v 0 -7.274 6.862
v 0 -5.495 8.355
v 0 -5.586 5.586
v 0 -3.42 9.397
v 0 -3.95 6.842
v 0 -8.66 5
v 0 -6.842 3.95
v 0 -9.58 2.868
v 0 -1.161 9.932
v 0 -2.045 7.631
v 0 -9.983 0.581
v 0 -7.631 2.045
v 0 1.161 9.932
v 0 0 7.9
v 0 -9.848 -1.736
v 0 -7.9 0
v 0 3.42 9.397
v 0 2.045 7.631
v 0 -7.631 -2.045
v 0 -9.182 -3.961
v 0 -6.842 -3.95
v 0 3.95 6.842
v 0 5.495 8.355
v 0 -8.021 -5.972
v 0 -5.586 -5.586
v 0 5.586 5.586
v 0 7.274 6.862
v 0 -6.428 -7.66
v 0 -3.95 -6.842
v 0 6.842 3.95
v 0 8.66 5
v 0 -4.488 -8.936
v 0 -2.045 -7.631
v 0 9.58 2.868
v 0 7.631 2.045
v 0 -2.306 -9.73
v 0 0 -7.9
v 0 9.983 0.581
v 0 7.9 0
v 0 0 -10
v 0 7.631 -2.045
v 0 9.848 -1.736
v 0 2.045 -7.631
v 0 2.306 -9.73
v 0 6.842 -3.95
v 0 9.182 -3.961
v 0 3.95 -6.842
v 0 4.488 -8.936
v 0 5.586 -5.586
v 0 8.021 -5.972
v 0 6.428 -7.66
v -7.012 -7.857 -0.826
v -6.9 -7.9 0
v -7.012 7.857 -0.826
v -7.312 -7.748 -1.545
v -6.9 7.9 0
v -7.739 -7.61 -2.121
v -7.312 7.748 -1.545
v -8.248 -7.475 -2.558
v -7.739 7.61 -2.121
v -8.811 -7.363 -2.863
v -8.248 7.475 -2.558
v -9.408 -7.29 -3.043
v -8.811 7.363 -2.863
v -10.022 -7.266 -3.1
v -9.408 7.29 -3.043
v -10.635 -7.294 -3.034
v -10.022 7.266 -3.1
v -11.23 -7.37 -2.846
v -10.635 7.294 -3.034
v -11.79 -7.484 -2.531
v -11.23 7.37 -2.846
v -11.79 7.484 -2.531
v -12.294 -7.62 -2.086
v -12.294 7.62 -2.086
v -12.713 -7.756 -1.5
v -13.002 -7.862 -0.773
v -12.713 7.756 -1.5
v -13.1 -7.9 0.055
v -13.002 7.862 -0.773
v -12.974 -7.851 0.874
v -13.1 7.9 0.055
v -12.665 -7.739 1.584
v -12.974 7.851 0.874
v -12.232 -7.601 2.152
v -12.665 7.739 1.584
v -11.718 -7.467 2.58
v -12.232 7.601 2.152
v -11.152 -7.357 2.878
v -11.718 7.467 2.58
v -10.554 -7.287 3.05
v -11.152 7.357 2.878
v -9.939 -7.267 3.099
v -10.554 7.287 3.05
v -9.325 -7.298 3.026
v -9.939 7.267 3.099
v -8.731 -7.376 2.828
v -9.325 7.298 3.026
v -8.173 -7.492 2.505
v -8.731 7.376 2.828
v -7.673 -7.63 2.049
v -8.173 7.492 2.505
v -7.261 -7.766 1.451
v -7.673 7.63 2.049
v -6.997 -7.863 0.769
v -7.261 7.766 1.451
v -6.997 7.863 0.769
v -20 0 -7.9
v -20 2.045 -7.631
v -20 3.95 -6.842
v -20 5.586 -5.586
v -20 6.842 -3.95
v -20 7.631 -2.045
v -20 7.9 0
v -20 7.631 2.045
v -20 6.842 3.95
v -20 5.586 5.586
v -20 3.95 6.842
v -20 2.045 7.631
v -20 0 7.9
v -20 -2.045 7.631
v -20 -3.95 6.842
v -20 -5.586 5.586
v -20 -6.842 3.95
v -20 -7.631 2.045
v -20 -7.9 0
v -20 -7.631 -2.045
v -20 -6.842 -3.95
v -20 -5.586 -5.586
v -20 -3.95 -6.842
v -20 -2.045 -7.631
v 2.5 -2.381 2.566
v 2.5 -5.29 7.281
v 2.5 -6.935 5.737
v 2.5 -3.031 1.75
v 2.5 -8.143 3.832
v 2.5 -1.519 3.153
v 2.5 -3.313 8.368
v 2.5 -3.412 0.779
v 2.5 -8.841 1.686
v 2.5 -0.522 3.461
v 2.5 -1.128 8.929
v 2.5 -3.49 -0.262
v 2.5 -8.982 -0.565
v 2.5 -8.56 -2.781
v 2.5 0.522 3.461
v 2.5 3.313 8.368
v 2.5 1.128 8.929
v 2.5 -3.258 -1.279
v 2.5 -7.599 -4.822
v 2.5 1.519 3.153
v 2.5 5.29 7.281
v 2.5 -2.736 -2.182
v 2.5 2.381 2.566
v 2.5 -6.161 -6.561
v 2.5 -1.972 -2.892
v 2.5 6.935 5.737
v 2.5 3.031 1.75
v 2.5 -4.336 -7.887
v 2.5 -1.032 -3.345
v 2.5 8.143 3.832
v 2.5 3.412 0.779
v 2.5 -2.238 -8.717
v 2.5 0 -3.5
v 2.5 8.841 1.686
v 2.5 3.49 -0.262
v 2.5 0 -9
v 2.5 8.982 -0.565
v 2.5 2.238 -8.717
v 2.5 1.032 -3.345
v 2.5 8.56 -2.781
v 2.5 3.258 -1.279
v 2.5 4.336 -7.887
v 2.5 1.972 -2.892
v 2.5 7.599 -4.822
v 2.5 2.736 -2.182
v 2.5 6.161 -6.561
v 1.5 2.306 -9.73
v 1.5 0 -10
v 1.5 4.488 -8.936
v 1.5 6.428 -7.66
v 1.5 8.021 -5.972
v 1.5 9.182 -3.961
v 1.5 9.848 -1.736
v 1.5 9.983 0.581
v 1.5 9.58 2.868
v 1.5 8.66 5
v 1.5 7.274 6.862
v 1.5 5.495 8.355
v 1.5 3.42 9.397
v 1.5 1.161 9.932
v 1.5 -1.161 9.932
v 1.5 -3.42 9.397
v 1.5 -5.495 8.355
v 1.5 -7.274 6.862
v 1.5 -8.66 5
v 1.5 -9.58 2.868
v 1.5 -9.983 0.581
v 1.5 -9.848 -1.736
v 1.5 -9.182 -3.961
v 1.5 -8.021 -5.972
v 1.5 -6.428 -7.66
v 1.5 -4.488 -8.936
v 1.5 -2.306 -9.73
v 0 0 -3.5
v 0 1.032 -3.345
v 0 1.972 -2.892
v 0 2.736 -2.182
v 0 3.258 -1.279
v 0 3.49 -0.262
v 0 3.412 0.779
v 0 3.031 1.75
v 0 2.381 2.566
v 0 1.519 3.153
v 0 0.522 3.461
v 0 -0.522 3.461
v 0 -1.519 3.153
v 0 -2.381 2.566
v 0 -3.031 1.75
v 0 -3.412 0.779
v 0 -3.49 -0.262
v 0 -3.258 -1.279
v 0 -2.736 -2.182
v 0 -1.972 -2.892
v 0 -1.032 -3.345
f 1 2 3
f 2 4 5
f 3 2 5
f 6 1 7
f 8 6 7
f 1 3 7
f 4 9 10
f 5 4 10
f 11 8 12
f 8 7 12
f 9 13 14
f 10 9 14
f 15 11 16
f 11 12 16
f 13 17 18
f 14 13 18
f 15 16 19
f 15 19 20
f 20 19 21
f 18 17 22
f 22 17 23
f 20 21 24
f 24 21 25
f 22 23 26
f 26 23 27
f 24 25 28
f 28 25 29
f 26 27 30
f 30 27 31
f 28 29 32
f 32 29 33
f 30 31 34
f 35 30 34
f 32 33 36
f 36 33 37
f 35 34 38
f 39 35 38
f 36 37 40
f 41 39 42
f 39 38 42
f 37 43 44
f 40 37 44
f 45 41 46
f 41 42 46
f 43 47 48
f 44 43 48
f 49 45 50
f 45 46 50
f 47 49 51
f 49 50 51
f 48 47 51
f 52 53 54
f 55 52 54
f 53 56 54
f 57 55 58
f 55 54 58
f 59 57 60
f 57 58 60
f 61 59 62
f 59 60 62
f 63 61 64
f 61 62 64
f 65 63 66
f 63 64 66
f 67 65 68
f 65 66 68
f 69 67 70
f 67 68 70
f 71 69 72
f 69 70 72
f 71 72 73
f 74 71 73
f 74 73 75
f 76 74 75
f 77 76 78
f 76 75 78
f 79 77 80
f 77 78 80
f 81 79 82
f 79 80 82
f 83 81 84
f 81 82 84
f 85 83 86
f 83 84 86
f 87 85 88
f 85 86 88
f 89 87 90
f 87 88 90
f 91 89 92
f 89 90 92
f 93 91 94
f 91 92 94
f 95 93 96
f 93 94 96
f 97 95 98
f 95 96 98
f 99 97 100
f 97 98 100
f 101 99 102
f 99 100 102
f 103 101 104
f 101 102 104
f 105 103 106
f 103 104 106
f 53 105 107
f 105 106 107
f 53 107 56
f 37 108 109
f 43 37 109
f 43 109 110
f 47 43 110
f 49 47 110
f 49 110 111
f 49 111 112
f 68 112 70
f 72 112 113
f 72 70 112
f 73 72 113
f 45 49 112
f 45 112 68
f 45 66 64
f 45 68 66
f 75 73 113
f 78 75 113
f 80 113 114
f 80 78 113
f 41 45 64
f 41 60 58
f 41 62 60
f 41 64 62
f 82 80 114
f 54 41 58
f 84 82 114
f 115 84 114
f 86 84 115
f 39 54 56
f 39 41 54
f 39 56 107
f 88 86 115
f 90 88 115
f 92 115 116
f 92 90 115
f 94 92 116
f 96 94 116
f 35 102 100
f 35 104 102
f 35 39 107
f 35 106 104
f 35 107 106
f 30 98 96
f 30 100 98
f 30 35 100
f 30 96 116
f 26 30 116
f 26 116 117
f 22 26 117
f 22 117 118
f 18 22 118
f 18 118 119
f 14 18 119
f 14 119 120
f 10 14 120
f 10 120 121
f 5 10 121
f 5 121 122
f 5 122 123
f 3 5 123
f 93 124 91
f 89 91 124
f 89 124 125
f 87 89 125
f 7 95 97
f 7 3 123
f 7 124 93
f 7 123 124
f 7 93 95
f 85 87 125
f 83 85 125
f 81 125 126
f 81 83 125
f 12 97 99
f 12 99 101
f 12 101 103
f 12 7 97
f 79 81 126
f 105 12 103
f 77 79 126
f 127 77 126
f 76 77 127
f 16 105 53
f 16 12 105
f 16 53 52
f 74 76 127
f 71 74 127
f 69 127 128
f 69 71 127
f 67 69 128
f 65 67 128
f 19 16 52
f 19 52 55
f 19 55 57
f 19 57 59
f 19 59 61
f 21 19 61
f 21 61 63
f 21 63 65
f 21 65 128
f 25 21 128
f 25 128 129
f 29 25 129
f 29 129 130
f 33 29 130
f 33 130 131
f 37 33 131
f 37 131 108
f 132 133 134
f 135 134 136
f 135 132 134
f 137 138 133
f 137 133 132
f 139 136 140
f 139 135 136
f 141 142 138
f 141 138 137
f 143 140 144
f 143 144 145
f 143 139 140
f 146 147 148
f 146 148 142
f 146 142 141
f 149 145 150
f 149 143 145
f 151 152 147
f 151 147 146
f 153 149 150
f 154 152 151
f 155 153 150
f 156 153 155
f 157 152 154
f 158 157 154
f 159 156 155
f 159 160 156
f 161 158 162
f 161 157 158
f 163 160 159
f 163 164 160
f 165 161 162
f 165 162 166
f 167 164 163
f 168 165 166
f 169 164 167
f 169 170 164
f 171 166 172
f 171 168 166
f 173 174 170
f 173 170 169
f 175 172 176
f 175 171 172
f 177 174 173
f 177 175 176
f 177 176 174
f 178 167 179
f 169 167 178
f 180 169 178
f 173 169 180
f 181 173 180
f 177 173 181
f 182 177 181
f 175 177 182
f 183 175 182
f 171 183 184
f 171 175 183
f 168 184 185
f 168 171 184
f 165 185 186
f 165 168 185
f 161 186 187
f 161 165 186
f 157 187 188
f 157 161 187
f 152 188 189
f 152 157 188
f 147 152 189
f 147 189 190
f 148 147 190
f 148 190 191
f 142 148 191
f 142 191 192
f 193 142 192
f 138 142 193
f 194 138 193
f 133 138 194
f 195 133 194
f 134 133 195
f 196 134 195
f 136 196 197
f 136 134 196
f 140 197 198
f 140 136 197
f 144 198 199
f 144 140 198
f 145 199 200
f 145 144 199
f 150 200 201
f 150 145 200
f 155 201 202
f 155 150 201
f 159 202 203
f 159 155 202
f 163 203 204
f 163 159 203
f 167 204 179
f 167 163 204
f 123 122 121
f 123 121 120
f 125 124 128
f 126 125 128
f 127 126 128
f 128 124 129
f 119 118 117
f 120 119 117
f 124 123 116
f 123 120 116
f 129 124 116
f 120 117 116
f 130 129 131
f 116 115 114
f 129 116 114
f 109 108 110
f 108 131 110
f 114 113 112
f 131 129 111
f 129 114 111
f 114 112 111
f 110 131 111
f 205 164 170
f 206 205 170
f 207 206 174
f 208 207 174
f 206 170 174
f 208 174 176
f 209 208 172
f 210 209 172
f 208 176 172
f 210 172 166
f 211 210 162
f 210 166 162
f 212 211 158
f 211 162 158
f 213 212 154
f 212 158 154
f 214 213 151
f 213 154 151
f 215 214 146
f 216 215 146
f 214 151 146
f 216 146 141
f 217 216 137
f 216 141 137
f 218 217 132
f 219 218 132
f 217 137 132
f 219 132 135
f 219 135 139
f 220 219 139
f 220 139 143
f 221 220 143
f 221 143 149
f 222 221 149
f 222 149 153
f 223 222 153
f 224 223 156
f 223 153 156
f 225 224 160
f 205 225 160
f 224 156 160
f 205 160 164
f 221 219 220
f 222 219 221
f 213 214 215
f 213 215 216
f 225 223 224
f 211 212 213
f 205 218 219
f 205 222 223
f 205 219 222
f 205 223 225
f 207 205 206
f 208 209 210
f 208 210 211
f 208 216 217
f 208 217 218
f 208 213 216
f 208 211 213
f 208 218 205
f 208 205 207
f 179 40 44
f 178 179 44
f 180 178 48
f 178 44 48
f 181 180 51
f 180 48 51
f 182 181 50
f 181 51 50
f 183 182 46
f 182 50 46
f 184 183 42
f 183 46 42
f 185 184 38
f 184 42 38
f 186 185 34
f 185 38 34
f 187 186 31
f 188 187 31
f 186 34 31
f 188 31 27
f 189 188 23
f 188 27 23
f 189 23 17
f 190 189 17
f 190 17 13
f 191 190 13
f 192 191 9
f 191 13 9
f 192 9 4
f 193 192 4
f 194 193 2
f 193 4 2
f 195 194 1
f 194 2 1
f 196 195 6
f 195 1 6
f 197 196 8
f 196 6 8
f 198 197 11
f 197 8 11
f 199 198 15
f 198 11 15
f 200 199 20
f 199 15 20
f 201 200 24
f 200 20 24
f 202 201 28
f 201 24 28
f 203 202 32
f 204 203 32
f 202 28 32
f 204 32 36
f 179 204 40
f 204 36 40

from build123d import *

# Parameters (mm, degrees)
SKETCH_1_R          = 7.9
EXTRUDE_1_DEPTH     = 20
SKETCH_5_R          = 3.1
CUT_EXTRUDE_2_DEPTH = 20
SKETCH_6_R          = 10
EXTRUDE_2_DEPTH     = 2.5
SKETCH_7_R          = 3.5
CUT_EXTRUDE_3_DEPTH = 2.5
CHAMFER_1_SIZE      = 1


with BuildPart() as part:
    # 草图1 → 凸台-拉伸1 (new body)
    with BuildSketch(Plane(origin=(0, 0, 0), x_dir=(0, 0, -1), z_dir=(1, 0, 0))):
        Circle(SKETCH_1_R)
    extrude(amount=-EXTRUDE_1_DEPTH)

    # 草图5 → 切除-拉伸2 (cut, symmetric)
    with BuildSketch(Plane(origin=(0, 0, 0), x_dir=(1, 0, 0), z_dir=(0, 1, 0))):
        with Locations((-10, 0)):
            Circle(SKETCH_5_R)
    extrude(amount=CUT_EXTRUDE_2_DEPTH, both=True, mode=Mode.SUBTRACT)

    # 草图6 → 凸台-拉伸2 (add)
    with BuildSketch(Plane(origin=(0, 0, 0), x_dir=(0, 0, -1), z_dir=(1, 0, 0))):
        Circle(SKETCH_6_R)
    extrude(amount=EXTRUDE_2_DEPTH)

    # 草图7 → 切除-拉伸3 (cut)
    with BuildSketch(Plane(origin=(2.5, 0, 0), x_dir=(0, 0, -1), z_dir=(1, 0, 0))):
        Circle(SKETCH_7_R)
    extrude(amount=-CUT_EXTRUDE_3_DEPTH, mode=Mode.SUBTRACT)

    # 倒角1
    chamfer_1_edges = [part.edges().sort_by_distance(p)[0] for p in [
        (2.5, 0, 10),
    ]]
    chamfer(chamfer_1_edges, length=CHAMFER_1_SIZE)


solid = part.part
